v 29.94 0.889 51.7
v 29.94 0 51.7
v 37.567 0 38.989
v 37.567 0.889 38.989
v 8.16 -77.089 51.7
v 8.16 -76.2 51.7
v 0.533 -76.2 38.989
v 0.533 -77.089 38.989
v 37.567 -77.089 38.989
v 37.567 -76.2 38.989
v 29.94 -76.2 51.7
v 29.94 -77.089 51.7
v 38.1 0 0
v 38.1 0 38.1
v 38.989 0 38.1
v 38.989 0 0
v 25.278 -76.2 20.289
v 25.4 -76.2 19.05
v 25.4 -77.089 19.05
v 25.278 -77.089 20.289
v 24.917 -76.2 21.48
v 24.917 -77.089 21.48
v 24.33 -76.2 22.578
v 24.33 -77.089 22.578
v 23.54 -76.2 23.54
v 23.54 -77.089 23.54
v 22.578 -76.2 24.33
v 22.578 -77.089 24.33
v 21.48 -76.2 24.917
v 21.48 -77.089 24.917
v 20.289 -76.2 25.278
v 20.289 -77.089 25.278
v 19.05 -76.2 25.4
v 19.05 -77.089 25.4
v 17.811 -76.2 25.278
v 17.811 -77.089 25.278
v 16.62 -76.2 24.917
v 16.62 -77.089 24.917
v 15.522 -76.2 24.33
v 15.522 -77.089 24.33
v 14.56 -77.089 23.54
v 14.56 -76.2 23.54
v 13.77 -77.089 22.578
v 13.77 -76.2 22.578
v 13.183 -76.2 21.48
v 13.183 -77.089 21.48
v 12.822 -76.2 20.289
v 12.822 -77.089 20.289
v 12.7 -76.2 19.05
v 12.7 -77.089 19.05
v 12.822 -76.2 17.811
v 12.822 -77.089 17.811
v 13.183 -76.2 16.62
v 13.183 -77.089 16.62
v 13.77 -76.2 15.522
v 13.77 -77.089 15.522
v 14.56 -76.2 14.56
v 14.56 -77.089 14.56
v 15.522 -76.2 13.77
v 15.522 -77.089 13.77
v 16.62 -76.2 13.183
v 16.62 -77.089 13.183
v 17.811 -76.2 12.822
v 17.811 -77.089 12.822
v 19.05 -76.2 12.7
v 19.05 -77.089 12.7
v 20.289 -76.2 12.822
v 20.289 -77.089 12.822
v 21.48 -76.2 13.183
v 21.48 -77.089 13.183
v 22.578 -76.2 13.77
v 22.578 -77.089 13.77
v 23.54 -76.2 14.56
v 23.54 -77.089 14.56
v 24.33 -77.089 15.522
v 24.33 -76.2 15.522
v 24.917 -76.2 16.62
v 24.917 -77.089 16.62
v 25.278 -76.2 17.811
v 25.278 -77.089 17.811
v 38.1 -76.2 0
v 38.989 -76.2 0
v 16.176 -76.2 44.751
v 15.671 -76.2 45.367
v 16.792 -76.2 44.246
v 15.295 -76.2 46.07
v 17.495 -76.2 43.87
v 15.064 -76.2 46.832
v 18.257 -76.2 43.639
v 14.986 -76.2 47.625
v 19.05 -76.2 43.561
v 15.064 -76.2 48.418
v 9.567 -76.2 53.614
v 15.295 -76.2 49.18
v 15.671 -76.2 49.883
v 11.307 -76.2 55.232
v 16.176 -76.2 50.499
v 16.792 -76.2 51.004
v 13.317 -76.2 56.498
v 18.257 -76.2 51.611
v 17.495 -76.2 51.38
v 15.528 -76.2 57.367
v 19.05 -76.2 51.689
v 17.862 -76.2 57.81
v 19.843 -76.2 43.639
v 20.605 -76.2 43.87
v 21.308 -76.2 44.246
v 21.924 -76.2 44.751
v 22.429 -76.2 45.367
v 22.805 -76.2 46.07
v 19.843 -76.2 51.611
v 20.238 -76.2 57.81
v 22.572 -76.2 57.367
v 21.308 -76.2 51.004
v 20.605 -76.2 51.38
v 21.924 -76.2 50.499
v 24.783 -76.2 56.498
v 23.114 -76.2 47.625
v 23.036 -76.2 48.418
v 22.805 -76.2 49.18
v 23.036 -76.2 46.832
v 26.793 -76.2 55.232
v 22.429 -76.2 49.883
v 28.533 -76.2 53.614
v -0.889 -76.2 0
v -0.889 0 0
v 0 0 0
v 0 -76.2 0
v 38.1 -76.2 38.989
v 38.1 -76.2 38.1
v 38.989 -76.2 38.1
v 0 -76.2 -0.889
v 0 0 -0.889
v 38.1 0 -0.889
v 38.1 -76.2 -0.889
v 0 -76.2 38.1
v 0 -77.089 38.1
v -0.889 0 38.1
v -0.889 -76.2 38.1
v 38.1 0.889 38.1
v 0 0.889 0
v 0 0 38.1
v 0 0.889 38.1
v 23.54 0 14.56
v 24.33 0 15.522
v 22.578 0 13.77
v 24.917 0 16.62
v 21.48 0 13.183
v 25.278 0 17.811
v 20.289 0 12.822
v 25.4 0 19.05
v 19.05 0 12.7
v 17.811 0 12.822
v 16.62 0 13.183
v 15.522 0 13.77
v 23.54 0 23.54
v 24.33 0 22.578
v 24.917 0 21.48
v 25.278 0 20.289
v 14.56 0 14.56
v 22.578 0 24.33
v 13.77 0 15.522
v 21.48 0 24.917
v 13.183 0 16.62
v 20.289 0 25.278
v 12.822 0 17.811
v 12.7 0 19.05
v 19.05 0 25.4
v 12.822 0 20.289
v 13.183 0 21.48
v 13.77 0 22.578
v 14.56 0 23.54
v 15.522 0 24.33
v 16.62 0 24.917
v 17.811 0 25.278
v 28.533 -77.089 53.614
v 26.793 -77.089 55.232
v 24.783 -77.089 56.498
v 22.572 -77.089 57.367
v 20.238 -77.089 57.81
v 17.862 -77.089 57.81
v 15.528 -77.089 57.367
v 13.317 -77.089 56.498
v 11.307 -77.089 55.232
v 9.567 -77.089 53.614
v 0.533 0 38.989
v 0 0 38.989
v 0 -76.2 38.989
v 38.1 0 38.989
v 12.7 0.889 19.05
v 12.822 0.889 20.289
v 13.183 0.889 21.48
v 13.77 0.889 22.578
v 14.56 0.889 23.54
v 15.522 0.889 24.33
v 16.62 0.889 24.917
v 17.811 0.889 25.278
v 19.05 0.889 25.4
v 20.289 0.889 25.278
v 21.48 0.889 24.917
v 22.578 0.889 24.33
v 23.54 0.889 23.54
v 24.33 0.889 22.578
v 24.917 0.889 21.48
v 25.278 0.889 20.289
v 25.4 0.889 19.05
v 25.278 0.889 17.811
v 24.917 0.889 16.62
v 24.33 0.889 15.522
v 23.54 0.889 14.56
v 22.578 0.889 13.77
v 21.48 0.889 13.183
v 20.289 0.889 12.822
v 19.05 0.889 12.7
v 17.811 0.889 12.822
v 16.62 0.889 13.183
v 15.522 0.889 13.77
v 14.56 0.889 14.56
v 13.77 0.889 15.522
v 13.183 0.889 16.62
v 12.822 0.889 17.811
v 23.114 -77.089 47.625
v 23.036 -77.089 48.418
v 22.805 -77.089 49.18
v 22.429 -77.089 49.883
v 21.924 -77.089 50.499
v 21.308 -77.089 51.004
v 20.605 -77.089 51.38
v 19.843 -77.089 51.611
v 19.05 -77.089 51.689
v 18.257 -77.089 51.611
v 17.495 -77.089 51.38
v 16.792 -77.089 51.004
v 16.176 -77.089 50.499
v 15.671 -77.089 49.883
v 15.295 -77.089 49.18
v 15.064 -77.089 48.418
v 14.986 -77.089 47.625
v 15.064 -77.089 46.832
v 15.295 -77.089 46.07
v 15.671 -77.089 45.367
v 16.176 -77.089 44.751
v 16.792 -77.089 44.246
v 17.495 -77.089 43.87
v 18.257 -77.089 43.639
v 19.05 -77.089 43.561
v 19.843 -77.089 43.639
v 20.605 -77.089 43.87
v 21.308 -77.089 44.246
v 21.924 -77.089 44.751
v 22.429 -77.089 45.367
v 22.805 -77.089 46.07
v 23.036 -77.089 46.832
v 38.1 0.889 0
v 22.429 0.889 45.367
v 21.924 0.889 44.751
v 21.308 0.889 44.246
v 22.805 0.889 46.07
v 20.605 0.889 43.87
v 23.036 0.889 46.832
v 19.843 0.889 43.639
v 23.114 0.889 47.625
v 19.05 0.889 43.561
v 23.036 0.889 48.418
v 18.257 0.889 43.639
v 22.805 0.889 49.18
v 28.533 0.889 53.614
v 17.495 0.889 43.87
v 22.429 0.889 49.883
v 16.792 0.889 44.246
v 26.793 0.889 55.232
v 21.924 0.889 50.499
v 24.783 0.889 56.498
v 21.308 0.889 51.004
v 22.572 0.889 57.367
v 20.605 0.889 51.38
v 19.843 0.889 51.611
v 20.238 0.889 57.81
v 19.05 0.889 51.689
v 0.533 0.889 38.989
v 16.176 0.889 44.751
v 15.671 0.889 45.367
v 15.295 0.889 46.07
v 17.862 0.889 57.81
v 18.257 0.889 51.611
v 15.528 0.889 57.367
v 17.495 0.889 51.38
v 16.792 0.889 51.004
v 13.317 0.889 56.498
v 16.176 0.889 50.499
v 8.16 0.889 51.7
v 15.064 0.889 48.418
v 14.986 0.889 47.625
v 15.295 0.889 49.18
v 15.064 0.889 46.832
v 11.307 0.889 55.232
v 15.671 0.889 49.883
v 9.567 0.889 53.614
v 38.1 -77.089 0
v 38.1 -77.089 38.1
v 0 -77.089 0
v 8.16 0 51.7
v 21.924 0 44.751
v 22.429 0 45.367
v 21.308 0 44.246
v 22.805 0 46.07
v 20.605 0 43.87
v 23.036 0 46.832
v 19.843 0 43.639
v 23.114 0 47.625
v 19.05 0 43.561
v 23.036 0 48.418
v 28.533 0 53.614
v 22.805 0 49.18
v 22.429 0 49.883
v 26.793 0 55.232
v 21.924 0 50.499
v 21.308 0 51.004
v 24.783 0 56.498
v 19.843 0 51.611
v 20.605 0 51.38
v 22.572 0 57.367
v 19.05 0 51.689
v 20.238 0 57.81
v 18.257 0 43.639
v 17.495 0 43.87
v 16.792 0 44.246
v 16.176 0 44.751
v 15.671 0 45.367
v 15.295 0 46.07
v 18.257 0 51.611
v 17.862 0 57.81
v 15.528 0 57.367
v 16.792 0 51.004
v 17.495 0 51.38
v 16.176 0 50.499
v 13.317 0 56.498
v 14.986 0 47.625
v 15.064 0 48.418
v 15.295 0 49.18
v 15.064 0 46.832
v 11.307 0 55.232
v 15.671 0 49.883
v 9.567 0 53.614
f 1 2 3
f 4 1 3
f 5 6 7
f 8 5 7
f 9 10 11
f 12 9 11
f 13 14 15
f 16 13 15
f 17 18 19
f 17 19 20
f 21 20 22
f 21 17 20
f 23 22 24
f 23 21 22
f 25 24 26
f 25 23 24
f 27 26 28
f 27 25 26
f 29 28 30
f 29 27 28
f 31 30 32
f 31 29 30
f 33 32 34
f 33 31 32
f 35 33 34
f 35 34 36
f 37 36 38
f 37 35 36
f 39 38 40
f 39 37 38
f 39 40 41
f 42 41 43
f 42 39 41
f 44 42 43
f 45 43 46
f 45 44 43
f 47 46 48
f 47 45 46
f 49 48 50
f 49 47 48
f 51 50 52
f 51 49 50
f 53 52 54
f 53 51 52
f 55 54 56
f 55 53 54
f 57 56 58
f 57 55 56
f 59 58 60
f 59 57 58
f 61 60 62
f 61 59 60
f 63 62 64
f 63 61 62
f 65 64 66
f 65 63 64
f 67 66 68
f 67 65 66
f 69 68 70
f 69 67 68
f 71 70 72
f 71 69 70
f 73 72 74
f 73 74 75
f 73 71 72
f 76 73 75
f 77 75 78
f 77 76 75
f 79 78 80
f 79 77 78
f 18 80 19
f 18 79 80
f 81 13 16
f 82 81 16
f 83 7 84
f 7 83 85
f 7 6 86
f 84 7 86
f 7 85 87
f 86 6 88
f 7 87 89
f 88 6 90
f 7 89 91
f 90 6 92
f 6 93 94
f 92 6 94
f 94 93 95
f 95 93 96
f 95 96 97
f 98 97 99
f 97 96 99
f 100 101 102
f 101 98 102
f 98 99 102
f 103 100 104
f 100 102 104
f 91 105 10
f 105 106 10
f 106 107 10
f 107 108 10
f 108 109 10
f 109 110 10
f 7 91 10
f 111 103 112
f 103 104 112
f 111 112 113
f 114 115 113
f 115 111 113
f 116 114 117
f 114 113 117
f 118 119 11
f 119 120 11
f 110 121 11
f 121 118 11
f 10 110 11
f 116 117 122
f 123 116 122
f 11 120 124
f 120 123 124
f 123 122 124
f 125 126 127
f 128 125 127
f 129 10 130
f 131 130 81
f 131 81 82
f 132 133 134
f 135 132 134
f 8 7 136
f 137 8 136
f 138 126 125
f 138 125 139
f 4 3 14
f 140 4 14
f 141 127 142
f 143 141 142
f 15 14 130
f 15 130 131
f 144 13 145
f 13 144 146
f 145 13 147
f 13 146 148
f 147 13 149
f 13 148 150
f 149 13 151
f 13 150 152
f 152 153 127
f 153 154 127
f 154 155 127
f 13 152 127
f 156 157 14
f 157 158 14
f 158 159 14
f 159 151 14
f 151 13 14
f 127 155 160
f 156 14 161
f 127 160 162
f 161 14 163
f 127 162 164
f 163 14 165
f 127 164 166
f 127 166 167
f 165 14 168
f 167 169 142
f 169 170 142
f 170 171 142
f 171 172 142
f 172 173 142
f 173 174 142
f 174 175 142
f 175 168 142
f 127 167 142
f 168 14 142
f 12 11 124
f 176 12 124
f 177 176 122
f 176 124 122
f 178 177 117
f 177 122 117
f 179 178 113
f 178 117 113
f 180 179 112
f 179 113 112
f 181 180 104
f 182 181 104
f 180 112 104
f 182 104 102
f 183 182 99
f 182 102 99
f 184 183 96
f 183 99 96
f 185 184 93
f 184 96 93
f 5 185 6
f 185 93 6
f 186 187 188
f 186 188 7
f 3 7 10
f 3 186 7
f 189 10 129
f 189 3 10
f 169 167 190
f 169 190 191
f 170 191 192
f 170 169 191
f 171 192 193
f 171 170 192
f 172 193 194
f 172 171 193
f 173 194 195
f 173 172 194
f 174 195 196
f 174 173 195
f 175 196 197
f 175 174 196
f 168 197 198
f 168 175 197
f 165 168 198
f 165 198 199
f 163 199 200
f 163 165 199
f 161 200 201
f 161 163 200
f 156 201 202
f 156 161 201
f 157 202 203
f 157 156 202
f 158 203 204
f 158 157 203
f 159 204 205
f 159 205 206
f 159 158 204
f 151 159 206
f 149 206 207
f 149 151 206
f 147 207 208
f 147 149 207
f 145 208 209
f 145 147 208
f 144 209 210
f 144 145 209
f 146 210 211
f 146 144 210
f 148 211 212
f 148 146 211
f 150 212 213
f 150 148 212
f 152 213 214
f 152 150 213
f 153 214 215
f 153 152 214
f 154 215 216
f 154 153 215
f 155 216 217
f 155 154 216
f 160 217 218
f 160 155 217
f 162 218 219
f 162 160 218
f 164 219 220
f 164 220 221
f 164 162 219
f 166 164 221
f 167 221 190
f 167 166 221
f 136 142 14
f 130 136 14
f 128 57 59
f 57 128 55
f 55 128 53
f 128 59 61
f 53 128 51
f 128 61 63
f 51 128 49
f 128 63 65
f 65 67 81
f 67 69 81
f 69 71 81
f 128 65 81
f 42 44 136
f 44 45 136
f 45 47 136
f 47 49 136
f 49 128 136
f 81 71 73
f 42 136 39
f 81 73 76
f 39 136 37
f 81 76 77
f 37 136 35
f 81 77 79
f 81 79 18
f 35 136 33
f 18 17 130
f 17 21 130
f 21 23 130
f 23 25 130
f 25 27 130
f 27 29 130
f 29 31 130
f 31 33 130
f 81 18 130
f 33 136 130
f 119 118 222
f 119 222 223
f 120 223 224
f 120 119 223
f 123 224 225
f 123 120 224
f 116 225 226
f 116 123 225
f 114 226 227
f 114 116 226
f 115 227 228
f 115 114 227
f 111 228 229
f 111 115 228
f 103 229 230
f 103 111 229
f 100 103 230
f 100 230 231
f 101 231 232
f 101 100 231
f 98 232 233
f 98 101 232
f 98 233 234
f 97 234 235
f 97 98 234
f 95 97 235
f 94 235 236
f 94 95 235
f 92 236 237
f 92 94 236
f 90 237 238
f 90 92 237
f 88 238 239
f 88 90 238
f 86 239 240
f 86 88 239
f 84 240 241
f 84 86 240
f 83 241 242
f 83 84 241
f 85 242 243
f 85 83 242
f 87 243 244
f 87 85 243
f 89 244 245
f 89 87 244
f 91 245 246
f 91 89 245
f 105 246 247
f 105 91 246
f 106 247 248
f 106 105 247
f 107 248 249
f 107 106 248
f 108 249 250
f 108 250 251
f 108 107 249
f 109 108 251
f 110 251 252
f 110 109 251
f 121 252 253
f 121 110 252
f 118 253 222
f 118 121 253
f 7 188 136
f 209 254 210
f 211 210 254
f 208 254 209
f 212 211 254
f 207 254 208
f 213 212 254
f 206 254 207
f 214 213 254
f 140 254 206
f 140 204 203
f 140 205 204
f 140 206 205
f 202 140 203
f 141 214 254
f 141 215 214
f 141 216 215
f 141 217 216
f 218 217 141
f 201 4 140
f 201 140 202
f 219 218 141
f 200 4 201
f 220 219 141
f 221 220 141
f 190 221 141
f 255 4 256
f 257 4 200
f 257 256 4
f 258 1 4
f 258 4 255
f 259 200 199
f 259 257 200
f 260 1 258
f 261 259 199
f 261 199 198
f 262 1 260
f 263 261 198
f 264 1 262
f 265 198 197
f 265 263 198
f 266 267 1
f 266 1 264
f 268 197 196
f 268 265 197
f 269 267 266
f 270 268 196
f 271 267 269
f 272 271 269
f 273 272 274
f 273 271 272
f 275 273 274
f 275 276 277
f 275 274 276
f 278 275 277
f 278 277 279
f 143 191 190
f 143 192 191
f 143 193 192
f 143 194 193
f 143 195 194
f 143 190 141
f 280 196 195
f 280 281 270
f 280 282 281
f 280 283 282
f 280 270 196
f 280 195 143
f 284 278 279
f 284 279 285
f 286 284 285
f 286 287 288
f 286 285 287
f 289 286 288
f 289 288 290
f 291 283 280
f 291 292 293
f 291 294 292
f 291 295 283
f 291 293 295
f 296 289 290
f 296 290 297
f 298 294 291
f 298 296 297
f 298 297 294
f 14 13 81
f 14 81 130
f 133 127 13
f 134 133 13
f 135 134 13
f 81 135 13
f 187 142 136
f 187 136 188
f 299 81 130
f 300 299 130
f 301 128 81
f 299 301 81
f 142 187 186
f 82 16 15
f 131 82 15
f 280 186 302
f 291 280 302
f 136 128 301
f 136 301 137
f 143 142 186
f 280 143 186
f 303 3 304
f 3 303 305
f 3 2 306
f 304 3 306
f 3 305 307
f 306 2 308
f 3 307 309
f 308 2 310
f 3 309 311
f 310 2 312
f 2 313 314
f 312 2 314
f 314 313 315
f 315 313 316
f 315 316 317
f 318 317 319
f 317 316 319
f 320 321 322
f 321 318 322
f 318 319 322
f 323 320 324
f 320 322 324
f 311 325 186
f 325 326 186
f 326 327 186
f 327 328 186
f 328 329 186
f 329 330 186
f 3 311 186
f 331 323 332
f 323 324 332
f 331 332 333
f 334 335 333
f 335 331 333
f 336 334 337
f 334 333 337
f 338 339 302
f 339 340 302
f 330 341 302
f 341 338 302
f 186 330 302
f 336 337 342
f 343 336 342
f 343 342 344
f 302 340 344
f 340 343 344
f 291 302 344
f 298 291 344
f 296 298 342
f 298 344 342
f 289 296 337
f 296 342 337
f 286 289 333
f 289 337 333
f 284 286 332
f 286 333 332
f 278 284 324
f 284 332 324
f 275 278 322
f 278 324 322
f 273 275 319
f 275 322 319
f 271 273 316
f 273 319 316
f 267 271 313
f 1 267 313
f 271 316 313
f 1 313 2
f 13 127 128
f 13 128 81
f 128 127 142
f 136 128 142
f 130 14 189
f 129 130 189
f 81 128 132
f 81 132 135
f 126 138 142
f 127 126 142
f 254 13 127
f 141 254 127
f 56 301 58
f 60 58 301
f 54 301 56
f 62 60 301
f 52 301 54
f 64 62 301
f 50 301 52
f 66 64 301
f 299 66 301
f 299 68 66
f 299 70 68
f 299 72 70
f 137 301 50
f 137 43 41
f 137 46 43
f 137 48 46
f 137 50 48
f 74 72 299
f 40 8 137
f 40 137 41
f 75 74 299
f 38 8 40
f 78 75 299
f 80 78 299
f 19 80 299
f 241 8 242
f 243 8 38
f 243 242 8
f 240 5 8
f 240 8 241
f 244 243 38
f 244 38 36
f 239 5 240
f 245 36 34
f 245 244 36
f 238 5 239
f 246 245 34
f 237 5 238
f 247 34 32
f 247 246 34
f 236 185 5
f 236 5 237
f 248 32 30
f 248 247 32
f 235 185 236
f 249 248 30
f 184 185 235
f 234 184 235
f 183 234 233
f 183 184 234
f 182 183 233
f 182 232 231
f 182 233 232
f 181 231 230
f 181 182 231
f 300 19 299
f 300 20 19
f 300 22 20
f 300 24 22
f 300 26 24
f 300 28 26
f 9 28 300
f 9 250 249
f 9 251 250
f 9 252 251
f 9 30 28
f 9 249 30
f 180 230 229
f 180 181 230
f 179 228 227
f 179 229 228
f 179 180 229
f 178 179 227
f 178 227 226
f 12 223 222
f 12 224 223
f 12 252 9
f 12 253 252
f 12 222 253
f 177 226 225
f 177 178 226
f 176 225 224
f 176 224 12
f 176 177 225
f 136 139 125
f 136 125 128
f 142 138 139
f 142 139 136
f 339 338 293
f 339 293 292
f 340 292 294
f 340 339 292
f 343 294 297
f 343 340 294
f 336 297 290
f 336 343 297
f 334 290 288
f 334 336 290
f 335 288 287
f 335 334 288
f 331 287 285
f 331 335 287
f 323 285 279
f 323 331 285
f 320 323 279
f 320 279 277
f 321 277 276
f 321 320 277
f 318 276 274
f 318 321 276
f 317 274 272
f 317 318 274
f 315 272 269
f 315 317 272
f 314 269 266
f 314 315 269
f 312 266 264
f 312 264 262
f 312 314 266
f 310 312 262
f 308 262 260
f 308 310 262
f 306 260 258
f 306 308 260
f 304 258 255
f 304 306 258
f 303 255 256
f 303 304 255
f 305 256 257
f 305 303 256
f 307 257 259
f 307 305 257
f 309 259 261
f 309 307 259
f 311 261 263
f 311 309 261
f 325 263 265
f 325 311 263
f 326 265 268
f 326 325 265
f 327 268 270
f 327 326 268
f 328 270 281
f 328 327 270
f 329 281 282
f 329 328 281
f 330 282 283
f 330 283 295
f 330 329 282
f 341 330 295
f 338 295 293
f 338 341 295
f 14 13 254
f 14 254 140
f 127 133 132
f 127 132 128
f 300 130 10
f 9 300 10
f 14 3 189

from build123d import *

# Parameters (mm, degrees)
F0_W     = 38.1
F0_H     = 0.889
F0_W_2   = 0.889
F0_H_2   = 38.1
F1_DEPTH = 76.2
F2_R     = 4.064
F2_W     = 38.1
F2_H     = 38.1
F2_R_2   = 6.35
F3_DEPTH = 0.889
F4_R     = 4.064
F4_W     = 38.1
F4_H     = 38.1
F4_R_2   = 6.35
F5_DEPTH = 0.889


with BuildPart() as f1:
    # F0 (on Front) → F1 (new body)
    with BuildSketch(Plane.XZ):
        with Locations((19.05, -0.4445)):
            Rectangle(F0_W, F0_H)
        with Locations((-0.4445, 19.05)):
            Rectangle(F0_W_2, F0_H_2)
        with Locations((19.05, 38.5445)):
            Rectangle(F0_W, F0_H)
        with Locations((38.5445, 19.05)):
            Rectangle(F0_W_2, F0_H_2)
    extrude(amount=F1_DEPTH)

    # F2 (on face) → F3 (join)
    with BuildSketch(Plane.XZ.offset(76.2)):
        with BuildLine():
            Line((8.15984, 51.699733), (0.5334, 38.989))
            Line((0.5334, 38.989), (37.5666, 38.989))
            Line((37.5666, 38.989), (29.94016, 51.699733))
            ThreePointArc((29.94016, 51.699733), (19.05, 57.865637), (8.15984, 51.699733))
        make_face()
        with Locations((19.05, 47.625)):
            Circle(F2_R, mode=Mode.SUBTRACT)
        with Locations((19.05, 19.05)):
            Rectangle(F2_W, F2_H)
        with Locations((19.05, 19.05)):
            Circle(F2_R_2, mode=Mode.SUBTRACT)
        Polygon((0.5334, 38.989), (0, 38.1), (38.1, 38.1), (37.5666, 38.989), align=None)
    extrude(amount=F3_DEPTH)

    # F4 (on face) → F5 (join)
    with BuildSketch(Plane(origin=(0, 0, 0), x_dir=(-1, 0, 0), z_dir=(0, 1, 0))):
        with BuildLine():
            Line((-0.5334, 38.989), (-8.15984, 51.699733))
            ThreePointArc((-8.15984, 51.699733), (-19.05, 57.865637), (-29.94016, 51.699733))
            Line((-29.94016, 51.699733), (-37.5666, 38.989))
            Line((-37.5666, 38.989), (-0.5334, 38.989))
        make_face()
        with Locations((-19.05, 47.625)):
            Circle(F4_R, mode=Mode.SUBTRACT)
        Polygon((0, 38.1), (-0.5334, 38.989), (-37.5666, 38.989), (-38.1, 38.1), align=None)
        with Locations((-19.05, 19.05)):
            Rectangle(F4_W, F4_H)
        with Locations((-19.05, 19.05)):
            Circle(F4_R_2, mode=Mode.SUBTRACT)
    extrude(amount=F5_DEPTH)


solid = f1.part
